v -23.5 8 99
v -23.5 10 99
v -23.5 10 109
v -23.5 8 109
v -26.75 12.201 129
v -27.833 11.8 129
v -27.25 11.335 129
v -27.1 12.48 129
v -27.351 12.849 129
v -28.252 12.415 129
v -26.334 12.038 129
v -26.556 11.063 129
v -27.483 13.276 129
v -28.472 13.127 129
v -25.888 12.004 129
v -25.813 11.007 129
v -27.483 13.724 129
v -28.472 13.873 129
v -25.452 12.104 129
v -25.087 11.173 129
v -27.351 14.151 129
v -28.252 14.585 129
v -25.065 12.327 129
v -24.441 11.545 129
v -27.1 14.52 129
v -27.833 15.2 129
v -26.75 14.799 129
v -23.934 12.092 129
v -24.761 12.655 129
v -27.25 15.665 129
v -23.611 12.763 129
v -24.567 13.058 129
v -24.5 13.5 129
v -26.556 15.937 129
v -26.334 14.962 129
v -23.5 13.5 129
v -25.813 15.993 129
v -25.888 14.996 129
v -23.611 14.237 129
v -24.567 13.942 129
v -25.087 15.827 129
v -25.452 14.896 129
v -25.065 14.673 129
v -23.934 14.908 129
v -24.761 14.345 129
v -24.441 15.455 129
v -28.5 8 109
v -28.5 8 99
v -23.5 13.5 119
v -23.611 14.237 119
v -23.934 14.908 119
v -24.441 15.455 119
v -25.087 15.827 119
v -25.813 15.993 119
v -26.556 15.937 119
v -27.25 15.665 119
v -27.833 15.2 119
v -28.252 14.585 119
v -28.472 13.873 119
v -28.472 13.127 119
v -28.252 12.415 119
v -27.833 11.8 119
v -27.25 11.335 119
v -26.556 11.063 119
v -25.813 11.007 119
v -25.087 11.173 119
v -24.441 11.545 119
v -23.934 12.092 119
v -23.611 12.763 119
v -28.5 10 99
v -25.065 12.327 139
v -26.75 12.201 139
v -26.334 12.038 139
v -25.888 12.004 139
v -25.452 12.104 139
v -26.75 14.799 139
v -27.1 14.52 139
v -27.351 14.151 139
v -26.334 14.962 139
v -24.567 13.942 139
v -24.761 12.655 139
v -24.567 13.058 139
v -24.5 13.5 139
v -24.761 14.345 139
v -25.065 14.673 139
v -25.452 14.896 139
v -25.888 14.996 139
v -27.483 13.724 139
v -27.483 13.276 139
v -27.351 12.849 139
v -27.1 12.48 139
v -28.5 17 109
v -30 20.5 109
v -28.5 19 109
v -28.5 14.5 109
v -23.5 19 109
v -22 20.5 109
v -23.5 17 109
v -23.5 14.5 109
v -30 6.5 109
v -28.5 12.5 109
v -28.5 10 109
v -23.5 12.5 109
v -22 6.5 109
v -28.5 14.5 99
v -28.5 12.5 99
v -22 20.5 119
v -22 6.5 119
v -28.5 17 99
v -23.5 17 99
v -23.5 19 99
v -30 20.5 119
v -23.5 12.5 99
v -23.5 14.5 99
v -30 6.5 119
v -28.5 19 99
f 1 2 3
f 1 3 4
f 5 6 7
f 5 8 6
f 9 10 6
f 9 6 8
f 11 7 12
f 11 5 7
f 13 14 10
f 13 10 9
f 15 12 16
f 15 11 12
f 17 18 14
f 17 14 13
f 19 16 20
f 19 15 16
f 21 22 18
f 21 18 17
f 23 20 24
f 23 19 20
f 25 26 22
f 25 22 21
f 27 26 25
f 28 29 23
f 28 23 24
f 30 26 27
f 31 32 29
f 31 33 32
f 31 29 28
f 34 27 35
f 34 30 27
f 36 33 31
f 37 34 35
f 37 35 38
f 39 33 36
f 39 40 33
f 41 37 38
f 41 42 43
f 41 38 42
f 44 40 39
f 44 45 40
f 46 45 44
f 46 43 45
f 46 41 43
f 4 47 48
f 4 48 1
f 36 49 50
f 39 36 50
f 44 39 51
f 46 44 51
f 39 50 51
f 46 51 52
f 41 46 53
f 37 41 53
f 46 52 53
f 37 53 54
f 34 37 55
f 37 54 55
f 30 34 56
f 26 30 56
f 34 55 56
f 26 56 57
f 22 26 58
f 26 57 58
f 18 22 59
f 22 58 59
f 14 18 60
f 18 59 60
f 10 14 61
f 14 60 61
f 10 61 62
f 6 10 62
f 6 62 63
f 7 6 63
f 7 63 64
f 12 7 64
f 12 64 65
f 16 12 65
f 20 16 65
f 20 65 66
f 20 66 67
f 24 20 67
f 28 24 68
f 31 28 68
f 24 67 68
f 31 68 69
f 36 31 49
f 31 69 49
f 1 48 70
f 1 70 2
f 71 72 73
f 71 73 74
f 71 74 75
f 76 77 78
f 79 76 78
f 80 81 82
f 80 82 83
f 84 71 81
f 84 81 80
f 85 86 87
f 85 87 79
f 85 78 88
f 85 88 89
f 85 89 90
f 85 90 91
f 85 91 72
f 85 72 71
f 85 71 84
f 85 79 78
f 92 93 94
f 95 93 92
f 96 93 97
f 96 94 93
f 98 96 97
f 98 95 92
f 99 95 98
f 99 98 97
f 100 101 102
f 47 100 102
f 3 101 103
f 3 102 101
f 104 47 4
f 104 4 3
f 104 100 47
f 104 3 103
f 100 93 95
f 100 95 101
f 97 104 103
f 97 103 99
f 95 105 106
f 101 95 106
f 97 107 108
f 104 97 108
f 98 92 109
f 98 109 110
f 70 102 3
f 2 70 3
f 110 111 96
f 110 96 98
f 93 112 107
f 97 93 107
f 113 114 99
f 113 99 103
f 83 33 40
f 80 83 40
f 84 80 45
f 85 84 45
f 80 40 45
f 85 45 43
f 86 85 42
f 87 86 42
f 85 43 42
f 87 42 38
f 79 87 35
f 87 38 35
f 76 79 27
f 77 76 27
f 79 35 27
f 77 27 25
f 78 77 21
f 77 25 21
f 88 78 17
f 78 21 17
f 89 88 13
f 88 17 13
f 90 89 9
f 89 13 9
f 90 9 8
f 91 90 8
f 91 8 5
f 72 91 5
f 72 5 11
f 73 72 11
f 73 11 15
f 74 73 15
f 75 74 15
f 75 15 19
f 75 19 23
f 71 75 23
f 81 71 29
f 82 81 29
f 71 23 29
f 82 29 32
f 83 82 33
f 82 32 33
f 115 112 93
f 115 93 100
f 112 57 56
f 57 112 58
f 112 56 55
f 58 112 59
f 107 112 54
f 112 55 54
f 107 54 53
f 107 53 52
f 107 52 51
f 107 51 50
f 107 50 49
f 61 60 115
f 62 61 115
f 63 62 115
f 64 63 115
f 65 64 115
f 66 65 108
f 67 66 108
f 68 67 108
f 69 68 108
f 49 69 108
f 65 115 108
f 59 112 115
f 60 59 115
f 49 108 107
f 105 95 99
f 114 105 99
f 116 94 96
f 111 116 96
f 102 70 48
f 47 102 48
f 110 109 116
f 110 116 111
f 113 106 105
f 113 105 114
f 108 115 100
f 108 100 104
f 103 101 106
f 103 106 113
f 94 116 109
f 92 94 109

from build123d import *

# Parameters (mm, degrees)
SKETCH022_R             = 2.5
PAD022_DEPTH            = 10
SKETCH023_R             = 1.5
PAD023_DEPTH            = 10
SKETCH024_W             = 8
SKETCH024_H             = 14
PAD024_DEPTH            = 10
SKETCH025_W             = 5
SKETCH025_H             = 2
PAD025_DEPTH            = 10
BODY009_PLACEMENT_ANGLE = 90


with BuildPart() as part:
    # Sketch022 → Pad022 (new body)
    with BuildSketch(Plane.XZ):
        Circle(SKETCH022_R)
    extrude(amount=PAD022_DEPTH)

    # Sketch023 (on Face3 of Pad022) → Pad023 (join)
    with BuildSketch(Plane.XZ.offset(10)):
        Circle(SKETCH023_R)
    extrude(amount=PAD023_DEPTH)

    # Sketch024 (on Face2 of Pad023) → Pad024 (join)
    with BuildSketch(Plane(origin=(0, 0, 0), x_dir=(1, 0, 0), z_dir=(0, 1, 0))):
        Rectangle(SKETCH024_W, SKETCH024_H)
    extrude(amount=PAD024_DEPTH)

    # Sketch025 (on Face5 of Pad024) → Pad025 (join)
    with BuildSketch(Plane(origin=(0, 10, 0), x_dir=(1, 0, 0), z_dir=(0, 1, 0))):
        with Locations((0, 4.5)):
            Rectangle(SKETCH025_W, SKETCH025_H)
        Rectangle(SKETCH025_W, SKETCH025_H)
        with Locations((0, -4.5)):
            Rectangle(SKETCH025_W, SKETCH025_H)
    extrude(amount=PAD025_DEPTH)


with BuildPart() as part_1:
    # Body009 placement: moved
    add(part.part.moved(Location((-26, 13.5, 119))).rotate(Axis((-26, 13.5, 119), (-1, 0, 0)), BODY009_PLACEMENT_ANGLE))


solid = part_1.part
